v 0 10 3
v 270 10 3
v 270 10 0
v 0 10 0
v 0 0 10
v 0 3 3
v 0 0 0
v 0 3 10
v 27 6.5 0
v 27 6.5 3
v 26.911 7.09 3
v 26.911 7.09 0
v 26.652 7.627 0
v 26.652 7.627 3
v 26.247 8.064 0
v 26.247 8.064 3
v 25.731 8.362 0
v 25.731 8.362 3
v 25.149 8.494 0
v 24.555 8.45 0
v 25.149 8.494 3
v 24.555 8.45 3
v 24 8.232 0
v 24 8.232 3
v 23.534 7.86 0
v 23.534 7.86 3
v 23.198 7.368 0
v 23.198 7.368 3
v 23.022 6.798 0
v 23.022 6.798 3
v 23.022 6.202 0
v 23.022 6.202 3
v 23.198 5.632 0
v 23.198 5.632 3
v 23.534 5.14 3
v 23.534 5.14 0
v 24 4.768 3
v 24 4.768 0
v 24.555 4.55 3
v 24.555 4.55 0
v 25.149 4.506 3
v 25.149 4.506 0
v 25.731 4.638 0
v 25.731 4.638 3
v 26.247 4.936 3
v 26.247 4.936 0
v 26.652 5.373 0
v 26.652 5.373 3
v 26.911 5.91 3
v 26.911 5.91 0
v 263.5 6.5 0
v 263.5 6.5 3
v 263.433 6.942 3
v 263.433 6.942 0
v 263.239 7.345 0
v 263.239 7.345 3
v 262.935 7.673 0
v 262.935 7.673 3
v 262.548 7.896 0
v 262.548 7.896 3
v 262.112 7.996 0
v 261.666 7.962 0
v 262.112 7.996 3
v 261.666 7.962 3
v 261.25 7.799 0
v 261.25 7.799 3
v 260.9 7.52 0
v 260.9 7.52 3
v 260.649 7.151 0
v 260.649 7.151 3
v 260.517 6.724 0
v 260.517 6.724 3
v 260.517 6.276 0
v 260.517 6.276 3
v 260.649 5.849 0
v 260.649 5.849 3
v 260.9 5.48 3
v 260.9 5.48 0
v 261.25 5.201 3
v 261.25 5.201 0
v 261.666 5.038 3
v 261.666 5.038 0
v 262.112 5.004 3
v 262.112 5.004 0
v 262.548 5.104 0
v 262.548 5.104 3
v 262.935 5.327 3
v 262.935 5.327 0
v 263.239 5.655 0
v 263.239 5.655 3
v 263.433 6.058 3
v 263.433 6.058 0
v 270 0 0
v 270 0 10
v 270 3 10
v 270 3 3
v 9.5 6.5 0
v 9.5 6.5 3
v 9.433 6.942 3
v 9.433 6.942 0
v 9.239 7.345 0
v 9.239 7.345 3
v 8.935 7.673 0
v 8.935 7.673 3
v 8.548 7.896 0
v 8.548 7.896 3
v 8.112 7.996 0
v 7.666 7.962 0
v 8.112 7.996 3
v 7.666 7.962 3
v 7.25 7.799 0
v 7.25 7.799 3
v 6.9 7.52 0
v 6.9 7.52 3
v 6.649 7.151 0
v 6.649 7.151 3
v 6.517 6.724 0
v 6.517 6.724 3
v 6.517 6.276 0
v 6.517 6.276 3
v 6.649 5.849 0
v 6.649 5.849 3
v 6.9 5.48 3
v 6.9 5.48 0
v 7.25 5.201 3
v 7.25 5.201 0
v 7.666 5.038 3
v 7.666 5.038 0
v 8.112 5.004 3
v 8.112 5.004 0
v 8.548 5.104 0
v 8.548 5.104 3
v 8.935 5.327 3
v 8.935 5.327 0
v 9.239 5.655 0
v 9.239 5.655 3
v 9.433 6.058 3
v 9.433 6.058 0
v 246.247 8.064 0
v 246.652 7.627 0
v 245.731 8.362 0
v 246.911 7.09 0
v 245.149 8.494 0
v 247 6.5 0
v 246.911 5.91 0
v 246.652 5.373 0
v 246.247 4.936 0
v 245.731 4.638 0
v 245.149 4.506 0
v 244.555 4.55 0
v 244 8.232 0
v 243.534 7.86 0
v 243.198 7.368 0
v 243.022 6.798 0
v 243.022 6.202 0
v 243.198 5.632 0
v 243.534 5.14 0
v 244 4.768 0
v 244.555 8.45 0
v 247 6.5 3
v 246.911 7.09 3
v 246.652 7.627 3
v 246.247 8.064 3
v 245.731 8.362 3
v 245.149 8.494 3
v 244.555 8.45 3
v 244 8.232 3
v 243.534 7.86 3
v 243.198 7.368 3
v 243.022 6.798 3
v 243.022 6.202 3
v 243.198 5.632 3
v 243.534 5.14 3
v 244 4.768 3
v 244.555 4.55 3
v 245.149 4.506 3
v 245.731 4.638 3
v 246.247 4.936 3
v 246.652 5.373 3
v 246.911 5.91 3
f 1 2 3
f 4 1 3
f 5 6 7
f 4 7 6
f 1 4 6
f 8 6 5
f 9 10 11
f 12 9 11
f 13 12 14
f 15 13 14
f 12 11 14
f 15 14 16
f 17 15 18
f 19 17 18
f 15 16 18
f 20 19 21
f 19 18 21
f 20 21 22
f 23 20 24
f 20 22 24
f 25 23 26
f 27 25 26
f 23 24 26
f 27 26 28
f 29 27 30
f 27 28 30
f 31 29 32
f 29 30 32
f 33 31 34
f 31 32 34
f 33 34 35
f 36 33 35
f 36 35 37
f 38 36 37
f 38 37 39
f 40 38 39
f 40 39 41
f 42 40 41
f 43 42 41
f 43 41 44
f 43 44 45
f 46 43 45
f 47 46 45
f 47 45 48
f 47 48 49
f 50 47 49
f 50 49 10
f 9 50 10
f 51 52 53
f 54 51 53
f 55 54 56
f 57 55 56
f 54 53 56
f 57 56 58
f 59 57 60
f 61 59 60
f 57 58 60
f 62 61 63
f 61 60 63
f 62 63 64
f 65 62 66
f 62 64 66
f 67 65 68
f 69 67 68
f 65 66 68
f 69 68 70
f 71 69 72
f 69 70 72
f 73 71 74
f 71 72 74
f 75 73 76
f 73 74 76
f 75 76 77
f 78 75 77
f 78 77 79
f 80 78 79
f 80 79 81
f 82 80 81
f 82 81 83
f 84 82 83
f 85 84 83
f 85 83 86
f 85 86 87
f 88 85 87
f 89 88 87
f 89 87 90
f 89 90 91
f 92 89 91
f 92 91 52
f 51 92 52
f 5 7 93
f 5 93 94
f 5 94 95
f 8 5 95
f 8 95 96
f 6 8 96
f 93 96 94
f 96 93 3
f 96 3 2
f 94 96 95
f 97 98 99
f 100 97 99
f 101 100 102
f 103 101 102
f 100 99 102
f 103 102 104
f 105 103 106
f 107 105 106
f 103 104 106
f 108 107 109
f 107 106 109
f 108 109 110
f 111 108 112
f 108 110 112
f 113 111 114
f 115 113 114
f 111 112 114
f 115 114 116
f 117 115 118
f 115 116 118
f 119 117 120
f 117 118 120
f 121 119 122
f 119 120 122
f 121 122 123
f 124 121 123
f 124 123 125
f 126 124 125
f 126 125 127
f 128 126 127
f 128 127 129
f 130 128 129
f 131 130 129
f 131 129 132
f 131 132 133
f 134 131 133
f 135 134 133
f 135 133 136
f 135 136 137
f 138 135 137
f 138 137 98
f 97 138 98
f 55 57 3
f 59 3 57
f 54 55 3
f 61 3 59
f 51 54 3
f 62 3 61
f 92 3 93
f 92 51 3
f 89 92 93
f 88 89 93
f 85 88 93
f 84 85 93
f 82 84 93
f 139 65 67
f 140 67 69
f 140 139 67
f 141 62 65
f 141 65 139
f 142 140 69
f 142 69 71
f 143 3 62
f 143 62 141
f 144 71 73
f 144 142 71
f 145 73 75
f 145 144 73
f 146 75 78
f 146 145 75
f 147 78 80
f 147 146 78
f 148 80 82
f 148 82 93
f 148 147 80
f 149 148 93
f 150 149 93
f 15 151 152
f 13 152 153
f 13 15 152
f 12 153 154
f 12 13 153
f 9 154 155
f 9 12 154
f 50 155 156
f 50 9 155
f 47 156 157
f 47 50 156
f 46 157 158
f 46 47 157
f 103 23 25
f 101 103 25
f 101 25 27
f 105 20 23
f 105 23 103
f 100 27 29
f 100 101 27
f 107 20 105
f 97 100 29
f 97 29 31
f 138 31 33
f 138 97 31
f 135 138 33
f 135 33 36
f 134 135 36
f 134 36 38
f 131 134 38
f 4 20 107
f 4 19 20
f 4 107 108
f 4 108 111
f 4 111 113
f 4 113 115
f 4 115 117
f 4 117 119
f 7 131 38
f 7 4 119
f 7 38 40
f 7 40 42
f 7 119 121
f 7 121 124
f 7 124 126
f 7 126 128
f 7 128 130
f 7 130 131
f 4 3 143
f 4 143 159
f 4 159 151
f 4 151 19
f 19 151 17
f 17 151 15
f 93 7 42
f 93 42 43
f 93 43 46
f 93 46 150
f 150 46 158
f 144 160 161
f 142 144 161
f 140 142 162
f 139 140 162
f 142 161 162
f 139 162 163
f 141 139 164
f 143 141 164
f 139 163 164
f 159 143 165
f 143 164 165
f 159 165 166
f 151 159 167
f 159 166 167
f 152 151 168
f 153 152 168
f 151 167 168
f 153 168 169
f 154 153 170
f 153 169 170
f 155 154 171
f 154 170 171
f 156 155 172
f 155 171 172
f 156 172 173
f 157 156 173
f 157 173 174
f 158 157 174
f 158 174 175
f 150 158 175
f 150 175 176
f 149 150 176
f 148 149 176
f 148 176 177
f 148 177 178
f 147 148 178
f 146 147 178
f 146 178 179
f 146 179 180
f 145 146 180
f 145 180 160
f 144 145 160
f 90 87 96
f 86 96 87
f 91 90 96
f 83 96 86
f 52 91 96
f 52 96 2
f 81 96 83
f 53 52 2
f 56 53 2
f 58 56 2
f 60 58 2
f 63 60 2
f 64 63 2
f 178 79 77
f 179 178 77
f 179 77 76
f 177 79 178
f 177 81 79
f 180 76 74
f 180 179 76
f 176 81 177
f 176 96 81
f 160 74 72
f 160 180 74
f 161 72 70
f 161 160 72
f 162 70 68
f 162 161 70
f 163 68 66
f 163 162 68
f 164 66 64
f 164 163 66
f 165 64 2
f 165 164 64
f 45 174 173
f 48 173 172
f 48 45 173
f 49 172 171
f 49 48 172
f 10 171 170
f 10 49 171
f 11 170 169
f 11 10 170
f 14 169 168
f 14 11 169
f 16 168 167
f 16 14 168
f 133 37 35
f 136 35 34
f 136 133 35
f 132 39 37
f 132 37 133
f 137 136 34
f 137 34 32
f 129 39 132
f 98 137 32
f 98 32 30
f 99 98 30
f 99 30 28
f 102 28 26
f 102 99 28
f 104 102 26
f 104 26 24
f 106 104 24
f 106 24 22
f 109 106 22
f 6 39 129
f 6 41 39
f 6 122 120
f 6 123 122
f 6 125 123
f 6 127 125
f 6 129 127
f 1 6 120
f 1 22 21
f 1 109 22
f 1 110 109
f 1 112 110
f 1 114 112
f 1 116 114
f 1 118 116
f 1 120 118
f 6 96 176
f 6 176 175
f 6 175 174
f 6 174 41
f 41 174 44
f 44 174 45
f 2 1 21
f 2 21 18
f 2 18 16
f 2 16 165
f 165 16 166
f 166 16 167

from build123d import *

# Parameters (mm, degrees)
EXTRUDE_1_DEPTH     = 270
SKETCH_2_R          = 2
CUT_EXTRUDE_1_DEPTH = 4
SKETCH_5_R          = 1.5
CUT_EXTRUDE_2_DEPTH = 4


with BuildPart() as part:
    # Эскиз1 → Бобышка-Вытянуть1 (new body)
    with BuildSketch(Plane(origin=(0, 0, 0), x_dir=(0, 0, -1), z_dir=(1, 0, 0))):
        Polygon((0, 0), (-10, 0), (-10, 3), (-3, 3), (-3, 10), (0, 10), align=None)
    extrude(amount=EXTRUDE_1_DEPTH)

    # Эскиз2 → Вырез-Вытянуть1 (cut, through all)
    with BuildSketch(Plane.XY.offset(3)):
        with Locations((25, 6.5)):
            Circle(SKETCH_2_R)
        with Locations((245, 6.5)):
            Circle(SKETCH_2_R)
    extrude(amount=-CUT_EXTRUDE_1_DEPTH, mode=Mode.SUBTRACT)

    # Эскиз5 → Вырез-Вытянуть2 (cut, through all)
    with BuildSketch(Plane.XY.offset(3)):
        with Locations((8, 6.5)):
            Circle(SKETCH_5_R)
        with Locations((262, 6.5)):
            Circle(SKETCH_5_R)
    extrude(amount=-CUT_EXTRUDE_2_DEPTH, mode=Mode.SUBTRACT)


solid = part.part
